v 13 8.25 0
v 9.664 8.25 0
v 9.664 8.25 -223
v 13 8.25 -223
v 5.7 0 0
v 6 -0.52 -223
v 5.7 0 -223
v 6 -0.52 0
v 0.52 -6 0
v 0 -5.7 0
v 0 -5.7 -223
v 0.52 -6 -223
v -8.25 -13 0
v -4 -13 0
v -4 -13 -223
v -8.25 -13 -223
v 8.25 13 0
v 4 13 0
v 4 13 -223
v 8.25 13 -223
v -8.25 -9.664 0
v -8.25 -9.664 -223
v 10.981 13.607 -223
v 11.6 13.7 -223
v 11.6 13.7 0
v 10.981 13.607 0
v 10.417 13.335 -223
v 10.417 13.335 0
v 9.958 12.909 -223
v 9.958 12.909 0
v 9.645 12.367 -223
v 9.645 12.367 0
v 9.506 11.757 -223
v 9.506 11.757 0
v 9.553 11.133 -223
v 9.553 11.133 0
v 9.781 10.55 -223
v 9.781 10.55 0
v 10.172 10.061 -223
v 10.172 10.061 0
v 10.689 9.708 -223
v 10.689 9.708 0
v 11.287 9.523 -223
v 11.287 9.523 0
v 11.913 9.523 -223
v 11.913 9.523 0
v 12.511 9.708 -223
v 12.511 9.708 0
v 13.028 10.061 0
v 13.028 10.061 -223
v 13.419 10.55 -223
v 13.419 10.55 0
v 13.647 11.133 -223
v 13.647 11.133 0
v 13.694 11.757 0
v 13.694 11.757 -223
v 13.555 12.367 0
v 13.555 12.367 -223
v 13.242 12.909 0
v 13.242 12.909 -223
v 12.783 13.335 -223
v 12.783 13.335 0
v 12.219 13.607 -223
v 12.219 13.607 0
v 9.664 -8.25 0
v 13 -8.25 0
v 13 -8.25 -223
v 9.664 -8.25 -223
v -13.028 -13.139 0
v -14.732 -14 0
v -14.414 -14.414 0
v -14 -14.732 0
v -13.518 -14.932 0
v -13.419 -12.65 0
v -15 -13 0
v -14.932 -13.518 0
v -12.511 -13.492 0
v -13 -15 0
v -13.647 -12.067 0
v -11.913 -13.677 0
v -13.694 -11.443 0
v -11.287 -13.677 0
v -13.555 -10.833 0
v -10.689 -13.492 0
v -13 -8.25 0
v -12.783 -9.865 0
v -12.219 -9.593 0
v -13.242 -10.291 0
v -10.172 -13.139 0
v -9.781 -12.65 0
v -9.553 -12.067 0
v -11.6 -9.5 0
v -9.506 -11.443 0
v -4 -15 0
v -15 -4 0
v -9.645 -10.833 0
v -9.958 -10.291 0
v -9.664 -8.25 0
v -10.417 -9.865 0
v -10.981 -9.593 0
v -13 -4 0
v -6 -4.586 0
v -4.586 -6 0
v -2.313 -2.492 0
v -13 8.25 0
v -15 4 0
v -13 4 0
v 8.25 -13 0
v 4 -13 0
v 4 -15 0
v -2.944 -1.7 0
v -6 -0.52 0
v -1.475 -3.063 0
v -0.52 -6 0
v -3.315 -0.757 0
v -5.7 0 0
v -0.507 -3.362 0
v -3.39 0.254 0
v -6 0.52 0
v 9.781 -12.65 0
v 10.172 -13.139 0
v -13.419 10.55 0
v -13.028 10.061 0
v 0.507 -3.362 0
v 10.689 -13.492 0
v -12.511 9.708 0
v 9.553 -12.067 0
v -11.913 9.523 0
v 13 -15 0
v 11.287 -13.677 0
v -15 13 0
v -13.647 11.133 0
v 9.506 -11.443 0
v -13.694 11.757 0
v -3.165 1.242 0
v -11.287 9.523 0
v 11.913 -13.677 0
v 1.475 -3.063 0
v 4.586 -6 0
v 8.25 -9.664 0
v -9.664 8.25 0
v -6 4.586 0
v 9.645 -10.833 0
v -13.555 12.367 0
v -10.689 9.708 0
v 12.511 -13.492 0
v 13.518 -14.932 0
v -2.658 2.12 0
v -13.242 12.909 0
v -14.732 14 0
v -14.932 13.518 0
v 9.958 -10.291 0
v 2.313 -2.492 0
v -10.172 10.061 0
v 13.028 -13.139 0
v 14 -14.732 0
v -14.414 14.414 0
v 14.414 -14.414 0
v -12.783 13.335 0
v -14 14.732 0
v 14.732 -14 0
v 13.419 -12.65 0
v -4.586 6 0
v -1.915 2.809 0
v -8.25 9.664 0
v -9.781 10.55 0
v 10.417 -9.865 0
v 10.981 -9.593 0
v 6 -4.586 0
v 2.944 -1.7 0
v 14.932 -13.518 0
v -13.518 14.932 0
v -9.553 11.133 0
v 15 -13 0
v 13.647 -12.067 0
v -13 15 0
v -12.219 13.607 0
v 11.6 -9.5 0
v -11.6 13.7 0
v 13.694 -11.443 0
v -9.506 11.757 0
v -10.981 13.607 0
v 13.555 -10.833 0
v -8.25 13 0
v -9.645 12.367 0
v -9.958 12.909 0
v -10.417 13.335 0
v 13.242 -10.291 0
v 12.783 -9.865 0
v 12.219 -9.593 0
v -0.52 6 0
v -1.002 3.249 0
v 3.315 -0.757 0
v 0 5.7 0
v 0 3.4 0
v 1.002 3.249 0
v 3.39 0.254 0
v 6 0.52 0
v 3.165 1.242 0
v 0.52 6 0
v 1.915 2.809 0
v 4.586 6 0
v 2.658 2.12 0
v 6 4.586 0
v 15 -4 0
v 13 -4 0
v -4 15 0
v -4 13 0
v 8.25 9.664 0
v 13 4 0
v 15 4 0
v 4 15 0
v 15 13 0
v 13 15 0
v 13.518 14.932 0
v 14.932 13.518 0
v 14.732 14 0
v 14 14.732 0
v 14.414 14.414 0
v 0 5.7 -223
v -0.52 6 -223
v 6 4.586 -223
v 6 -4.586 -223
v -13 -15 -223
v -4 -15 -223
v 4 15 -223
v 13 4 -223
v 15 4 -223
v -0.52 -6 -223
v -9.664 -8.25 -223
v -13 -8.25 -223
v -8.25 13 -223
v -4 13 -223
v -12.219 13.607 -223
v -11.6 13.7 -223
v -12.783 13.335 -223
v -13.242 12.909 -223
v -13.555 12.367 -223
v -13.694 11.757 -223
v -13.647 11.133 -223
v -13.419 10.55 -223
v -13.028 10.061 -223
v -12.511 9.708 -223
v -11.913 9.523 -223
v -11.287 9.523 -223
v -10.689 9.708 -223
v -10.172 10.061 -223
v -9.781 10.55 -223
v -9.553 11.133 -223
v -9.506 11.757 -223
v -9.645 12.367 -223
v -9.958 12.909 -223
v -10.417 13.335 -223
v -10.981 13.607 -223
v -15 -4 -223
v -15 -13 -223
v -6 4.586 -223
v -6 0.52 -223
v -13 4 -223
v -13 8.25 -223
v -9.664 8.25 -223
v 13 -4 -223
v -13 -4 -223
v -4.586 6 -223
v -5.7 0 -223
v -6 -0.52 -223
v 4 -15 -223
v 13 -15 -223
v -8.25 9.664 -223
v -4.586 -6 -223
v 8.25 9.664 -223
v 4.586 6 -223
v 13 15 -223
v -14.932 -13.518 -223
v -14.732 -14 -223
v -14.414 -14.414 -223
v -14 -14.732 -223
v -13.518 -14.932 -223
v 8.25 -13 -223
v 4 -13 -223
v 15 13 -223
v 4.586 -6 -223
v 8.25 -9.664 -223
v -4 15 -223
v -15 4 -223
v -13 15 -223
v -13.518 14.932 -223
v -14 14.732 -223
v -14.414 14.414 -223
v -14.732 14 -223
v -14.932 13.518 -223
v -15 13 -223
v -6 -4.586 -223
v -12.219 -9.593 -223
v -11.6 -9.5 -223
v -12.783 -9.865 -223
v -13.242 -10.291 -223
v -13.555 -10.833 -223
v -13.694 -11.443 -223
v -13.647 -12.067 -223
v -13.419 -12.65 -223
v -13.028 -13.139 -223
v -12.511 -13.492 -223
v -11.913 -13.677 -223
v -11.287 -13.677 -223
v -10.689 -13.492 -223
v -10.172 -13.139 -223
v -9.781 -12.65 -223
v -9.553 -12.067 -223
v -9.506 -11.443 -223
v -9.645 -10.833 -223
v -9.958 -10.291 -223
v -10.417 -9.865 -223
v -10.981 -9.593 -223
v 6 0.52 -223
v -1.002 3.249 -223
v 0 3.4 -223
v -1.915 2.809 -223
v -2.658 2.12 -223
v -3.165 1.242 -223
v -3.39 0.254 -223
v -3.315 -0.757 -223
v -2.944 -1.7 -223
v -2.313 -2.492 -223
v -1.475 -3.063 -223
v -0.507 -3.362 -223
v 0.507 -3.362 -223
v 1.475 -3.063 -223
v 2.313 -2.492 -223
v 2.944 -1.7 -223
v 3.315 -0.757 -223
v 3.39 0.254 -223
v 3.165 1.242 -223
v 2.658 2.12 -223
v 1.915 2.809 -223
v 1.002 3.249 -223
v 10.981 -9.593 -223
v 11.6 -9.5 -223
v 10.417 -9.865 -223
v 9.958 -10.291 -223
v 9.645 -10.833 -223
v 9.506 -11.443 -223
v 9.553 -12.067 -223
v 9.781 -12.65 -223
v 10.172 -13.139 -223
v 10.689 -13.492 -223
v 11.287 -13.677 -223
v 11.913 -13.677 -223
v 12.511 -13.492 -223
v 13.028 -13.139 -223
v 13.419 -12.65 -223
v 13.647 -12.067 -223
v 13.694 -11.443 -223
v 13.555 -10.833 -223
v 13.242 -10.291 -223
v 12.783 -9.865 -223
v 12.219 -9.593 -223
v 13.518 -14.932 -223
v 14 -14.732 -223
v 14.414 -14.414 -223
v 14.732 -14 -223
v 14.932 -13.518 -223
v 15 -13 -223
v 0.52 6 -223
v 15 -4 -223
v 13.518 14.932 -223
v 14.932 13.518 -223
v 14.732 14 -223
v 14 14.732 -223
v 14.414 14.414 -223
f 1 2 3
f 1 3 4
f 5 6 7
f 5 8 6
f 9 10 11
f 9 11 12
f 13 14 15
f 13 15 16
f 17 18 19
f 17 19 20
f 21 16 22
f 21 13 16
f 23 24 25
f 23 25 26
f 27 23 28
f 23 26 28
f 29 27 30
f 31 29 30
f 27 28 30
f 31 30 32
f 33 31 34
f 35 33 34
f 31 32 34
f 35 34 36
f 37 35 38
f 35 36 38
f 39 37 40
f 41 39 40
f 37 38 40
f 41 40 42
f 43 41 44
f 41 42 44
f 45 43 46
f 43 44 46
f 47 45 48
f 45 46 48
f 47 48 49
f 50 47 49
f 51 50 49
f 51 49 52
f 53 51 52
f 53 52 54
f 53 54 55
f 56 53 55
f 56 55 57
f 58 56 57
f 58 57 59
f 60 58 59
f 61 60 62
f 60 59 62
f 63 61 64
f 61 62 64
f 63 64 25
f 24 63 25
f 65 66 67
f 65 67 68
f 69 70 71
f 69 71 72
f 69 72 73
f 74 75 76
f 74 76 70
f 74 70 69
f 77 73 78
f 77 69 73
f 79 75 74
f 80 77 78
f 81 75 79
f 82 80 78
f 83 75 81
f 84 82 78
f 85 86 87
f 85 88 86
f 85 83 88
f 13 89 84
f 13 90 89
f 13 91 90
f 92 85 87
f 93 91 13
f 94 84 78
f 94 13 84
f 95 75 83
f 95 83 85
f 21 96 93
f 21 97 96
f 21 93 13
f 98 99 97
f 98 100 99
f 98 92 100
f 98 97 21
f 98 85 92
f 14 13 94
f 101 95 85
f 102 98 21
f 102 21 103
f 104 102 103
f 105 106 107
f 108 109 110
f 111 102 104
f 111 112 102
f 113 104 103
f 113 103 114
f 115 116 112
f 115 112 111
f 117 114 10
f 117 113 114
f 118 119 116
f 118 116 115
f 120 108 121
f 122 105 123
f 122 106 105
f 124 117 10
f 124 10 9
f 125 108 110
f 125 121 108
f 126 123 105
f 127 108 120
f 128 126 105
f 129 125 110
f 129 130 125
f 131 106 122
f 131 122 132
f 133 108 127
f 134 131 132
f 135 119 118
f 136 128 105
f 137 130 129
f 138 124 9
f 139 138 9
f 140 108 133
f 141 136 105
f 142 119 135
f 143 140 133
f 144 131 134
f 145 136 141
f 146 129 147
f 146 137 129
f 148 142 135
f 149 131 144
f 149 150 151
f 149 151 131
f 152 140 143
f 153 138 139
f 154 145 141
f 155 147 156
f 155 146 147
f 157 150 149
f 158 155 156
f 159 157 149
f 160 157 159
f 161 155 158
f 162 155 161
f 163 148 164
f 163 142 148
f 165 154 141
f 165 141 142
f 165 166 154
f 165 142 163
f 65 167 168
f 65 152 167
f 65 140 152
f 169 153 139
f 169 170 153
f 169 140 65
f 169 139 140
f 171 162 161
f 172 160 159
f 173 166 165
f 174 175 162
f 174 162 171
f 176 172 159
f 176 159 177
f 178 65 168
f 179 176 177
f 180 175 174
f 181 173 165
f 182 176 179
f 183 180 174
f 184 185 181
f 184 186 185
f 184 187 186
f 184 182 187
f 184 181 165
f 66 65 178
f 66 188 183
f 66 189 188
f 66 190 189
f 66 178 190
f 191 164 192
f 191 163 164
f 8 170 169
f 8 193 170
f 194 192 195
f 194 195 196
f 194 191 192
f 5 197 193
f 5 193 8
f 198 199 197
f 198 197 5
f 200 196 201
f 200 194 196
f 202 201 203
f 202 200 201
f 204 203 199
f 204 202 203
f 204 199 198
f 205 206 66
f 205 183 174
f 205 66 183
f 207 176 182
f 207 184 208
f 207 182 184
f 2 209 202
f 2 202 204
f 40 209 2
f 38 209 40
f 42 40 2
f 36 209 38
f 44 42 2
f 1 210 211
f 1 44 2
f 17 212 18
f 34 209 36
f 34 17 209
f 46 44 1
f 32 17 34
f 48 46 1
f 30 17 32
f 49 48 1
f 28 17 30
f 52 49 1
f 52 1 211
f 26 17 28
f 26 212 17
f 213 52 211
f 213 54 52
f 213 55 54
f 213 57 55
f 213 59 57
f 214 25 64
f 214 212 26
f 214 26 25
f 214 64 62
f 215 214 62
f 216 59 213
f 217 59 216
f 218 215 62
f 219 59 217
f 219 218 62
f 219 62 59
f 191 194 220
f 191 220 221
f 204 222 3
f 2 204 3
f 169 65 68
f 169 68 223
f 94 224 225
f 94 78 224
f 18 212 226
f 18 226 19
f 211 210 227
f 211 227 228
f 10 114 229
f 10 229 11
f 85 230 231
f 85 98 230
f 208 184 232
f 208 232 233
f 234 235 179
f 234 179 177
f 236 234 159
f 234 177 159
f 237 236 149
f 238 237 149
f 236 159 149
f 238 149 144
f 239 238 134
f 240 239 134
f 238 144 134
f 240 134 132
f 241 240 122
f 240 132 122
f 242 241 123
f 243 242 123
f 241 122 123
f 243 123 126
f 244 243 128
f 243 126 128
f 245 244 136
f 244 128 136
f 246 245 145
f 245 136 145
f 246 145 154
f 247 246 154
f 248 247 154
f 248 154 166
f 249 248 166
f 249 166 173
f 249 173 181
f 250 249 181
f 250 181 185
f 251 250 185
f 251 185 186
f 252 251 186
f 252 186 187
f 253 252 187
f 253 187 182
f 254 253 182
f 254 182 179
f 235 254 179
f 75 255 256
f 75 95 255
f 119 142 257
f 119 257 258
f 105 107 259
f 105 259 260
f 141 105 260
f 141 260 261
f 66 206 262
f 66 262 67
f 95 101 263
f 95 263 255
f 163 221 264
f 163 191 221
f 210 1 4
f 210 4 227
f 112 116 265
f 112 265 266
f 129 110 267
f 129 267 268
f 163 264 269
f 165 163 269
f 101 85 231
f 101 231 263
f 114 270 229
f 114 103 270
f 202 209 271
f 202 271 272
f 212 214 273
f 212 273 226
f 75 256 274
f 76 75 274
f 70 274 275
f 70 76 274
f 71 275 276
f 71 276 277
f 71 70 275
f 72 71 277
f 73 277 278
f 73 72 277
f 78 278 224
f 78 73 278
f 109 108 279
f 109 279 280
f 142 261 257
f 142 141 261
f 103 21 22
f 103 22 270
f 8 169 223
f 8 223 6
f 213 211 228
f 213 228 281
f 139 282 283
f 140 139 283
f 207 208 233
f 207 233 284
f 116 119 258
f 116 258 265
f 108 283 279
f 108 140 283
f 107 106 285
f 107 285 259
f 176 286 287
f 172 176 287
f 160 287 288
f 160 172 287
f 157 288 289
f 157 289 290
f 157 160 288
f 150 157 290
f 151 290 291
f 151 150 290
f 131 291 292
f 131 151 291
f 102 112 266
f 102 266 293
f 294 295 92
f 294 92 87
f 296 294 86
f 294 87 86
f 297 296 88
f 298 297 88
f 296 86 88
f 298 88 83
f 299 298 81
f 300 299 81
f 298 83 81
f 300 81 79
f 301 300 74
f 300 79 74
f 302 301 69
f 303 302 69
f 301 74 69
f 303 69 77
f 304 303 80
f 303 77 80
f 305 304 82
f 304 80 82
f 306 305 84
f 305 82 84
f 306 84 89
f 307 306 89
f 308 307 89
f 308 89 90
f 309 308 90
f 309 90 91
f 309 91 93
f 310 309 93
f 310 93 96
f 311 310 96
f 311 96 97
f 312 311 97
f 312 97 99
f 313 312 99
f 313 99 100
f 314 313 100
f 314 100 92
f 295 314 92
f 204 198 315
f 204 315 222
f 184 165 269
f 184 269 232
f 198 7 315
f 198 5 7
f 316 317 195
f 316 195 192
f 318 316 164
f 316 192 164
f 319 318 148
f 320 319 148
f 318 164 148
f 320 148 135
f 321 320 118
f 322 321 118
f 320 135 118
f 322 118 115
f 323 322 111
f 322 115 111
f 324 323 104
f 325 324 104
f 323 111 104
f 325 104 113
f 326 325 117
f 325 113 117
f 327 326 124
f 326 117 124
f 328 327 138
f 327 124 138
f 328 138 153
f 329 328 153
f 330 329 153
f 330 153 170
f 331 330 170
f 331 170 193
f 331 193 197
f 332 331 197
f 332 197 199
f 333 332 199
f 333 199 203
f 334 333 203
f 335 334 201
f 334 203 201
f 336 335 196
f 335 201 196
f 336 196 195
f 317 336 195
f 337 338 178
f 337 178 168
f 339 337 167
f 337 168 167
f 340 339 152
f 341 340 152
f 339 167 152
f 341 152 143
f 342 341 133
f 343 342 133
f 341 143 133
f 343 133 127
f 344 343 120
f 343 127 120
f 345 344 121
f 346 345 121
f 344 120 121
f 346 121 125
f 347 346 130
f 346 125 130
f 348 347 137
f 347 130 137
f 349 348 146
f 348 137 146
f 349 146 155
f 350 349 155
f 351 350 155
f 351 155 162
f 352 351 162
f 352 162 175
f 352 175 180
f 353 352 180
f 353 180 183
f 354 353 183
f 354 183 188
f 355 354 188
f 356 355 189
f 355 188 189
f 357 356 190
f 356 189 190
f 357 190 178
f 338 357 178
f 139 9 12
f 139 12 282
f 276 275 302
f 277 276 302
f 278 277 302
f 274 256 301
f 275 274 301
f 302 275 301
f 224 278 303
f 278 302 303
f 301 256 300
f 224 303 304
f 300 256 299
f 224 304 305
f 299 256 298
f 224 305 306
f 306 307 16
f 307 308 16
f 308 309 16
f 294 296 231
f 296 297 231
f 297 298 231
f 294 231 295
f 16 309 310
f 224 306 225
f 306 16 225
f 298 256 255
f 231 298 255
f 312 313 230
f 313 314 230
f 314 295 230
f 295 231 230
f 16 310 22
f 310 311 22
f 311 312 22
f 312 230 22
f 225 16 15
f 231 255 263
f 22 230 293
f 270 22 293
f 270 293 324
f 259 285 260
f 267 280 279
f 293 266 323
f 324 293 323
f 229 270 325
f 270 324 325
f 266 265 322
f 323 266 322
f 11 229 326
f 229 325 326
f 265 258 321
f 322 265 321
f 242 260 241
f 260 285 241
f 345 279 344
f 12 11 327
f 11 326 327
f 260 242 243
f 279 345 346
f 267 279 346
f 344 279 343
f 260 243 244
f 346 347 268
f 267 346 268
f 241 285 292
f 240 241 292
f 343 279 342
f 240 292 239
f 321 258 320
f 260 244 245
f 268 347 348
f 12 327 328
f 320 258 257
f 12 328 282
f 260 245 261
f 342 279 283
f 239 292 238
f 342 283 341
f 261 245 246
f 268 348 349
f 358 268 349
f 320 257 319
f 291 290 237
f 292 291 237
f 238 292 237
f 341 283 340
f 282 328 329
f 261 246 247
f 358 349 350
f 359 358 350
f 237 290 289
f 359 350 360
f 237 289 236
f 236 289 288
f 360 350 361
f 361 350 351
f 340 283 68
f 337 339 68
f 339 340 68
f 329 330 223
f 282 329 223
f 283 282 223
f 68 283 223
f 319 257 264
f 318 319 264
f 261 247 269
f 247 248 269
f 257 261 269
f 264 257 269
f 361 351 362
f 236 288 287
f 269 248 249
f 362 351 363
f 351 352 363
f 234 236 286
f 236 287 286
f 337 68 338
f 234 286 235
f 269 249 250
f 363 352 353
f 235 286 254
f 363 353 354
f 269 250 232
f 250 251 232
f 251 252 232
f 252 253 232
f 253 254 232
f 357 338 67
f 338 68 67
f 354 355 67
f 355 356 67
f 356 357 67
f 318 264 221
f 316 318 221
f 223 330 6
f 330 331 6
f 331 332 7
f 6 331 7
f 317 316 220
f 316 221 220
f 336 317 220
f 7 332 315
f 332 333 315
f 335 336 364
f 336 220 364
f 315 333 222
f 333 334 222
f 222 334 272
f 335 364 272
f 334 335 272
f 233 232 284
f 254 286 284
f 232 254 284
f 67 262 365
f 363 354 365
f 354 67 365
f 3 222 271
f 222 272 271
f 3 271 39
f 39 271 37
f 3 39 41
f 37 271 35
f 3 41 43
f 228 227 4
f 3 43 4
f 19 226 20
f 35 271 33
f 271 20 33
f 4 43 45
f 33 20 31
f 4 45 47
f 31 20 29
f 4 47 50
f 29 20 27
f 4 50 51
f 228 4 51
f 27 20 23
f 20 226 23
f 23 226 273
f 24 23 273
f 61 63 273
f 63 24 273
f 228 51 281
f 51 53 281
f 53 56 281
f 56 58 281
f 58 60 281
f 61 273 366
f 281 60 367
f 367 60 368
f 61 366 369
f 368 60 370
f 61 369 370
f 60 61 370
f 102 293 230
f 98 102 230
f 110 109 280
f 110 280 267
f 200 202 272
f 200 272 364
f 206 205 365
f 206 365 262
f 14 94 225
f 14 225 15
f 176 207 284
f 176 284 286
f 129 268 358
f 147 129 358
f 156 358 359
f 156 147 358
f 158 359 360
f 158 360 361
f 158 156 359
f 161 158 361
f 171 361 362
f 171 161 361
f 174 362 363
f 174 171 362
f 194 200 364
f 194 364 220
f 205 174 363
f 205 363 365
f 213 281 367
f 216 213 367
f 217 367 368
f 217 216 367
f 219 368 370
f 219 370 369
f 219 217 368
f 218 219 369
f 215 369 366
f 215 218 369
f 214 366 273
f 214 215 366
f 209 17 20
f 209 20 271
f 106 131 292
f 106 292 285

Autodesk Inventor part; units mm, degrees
sketch "Sketch_1" plane through (0, 0, 0) normal (0, 0, 1) x (1, 0, 0)
  line L0 (-15, -4) -> (-15, -13)
  arc A0 (-15, -13) -> (-13, -15) centre (-13, -13) ccw
  line L1 (-13, -15) -> (-4, -15)
  line L2 (-4, -15) -> (-4, -13)
  line L3 (-4, -13) -> (-8.25, -13)
  line L4 (-8.25, -13) -> (-8.25, -9.6642)
  line L5 (-8.25, -9.6642) -> (-4.5858, -6)
  line L6 (-4.5858, -6) -> (-0.5196, -6)
  line L7 (-0.5196, -6) -> (0, -5.7)
  line L8 (0, -5.7) -> (0.5196, -6)
  line L9 (0.5196, -6) -> (4.5858, -6)
  line L10 (4.5858, -6) -> (8.25, -9.6642)
  line L11 (8.25, -9.6642) -> (8.25, -13)
  line L12 (8.25, -13) -> (4, -13)
  line L13 (4, -13) -> (4, -15)
  line L14 (4, -15) -> (13, -15)
  arc A1 (13, -15) -> (15, -13) centre (13, -13) ccw
  line L15 (15, -13) -> (15, -4)
  line L16 (15, -4) -> (13, -4)
  line L17 (13, -4) -> (13, -8.25)
  line L18 (13, -8.25) -> (9.6642, -8.25)
  line L19 (9.6642, -8.25) -> (6, -4.5858)
  line L20 (6, -4.5858) -> (6, -0.5196)
  line L21 (6, -0.5196) -> (5.7, 0)
  line L22 (5.7, 0) -> (6, 0.5196)
  line L23 (6, 0.5196) -> (6, 4.5858)
  line L24 (6, 4.5858) -> (9.6642, 8.25)
  line L25 (9.6642, 8.25) -> (13, 8.25)
  line L26 (13, 8.25) -> (13, 4)
  line L27 (13, 4) -> (15, 4)
  line L28 (15, 4) -> (15, 13)
  arc A2 (15, 13) -> (13, 15) centre (13, 13) ccw
  line L29 (13, 15) -> (4, 15)
  line L30 (4, 15) -> (4, 13)
  line L31 (4, 13) -> (8.25, 13)
  line L32 (8.25, 13) -> (8.25, 9.6642)
  line L33 (8.25, 9.6642) -> (4.5858, 6)
  line L34 (4.5858, 6) -> (0.5196, 6)
  line L35 (0.5196, 6) -> (0, 5.7)
  line L36 (0, 5.7) -> (-0.5196, 6)
  line L37 (-0.5196, 6) -> (-4.5858, 6)
  line L38 (-4.5858, 6) -> (-8.25, 9.6642)
  line L39 (-8.25, 9.6642) -> (-8.25, 13)
  line L40 (-8.25, 13) -> (-4, 13)
  line L41 (-4, 13) -> (-4, 15)
  line L42 (-4, 15) -> (-13, 15)
  arc A3 (-13, 15) -> (-15, 13) centre (-13, 13) ccw
  line L43 (-15, 13) -> (-15, 4)
  line L44 (-15, 4) -> (-13, 4)
  line L45 (-13, 4) -> (-13, 8.25)
  line L46 (-13, 8.25) -> (-9.6642, 8.25)
  line L47 (-9.6642, 8.25) -> (-6, 4.5858)
  line L48 (-6, 4.5858) -> (-6, 0.5196)
  line L49 (-6, 0.5196) -> (-5.7, 0)
  line L50 (-5.7, 0) -> (-6, -0.5196)
  line L51 (-6, -0.5196) -> (-6, -4.5858)
  line L52 (-6, -4.5858) -> (-9.6642, -8.25)
  line L53 (-9.6642, -8.25) -> (-13, -8.25)
  line L54 (-13, -8.25) -> (-13, -4)
  line L55 (-13, -4) -> (-15, -4)
extrude "Extrusion1" add sketch "Sketch_1" against normal blind 223
sketch "Sketch2" plane through (0, 0, -223) normal (0, 0, -1) x (-1, 0, 0)
  point P0 (0, 0)
hole "Hole1" at (0, 0, -223) direction (0, 0, 1) diameter 6.8 depth 223
sketch "Sketch3" plane through (0, 0, -223) normal (0, 0, -1) x (-1, 0, 0)
  point P0 (-11.6, 11.6)
hole "Hole2" at (11.6, 11.6, -223) direction (0, 0, 1) diameter 4.2 depth 223
pattern_linear "Rectangular Pattern1" count 2 spacing 23.2 along (-1, 0, 0) count 2 spacing 23.2 along (0, -1, 0) of "Hole2"
ref_plane "C1_XY" through (0, 0, 0) normal (0, 0, 1) x (1, 0, 0)
ref_plane "C1_YZ" through (0, 0, 0) normal (1, 0, 0) x (0, 1, 0)
ref_plane "C1_ZX" through (0, 0, 0) normal (0, 1, 0) x (0, 0, 1)
ref_plane "to_frame_cap1_XY" through (0, 0, 0) normal (0, 0, 1) x (1, 0, 0)
ref_plane "to_frame_cap1_YZ" through (0, 0, 0) normal (1, 0, 0) x (0, 1, 0)
ref_plane "to_frame_cap1_ZX" through (0, 0, 0) normal (0, 1, 0) x (0, 0, 1)
ref_plane "to_frame_cap2_XY" through (0, 0, -223) normal (0, 0, -1) x (1, 0, 0)
ref_plane "to_frame_cap2_YZ" through (0, 0, -223) normal (1, 0, 0) x (0, -1, 0)
ref_plane "to_frame_cap2_ZX" through (0, 0, -223) normal (0, -1, 0) x (0, 0, -1)
properties part number "HFS6-3030-223"
